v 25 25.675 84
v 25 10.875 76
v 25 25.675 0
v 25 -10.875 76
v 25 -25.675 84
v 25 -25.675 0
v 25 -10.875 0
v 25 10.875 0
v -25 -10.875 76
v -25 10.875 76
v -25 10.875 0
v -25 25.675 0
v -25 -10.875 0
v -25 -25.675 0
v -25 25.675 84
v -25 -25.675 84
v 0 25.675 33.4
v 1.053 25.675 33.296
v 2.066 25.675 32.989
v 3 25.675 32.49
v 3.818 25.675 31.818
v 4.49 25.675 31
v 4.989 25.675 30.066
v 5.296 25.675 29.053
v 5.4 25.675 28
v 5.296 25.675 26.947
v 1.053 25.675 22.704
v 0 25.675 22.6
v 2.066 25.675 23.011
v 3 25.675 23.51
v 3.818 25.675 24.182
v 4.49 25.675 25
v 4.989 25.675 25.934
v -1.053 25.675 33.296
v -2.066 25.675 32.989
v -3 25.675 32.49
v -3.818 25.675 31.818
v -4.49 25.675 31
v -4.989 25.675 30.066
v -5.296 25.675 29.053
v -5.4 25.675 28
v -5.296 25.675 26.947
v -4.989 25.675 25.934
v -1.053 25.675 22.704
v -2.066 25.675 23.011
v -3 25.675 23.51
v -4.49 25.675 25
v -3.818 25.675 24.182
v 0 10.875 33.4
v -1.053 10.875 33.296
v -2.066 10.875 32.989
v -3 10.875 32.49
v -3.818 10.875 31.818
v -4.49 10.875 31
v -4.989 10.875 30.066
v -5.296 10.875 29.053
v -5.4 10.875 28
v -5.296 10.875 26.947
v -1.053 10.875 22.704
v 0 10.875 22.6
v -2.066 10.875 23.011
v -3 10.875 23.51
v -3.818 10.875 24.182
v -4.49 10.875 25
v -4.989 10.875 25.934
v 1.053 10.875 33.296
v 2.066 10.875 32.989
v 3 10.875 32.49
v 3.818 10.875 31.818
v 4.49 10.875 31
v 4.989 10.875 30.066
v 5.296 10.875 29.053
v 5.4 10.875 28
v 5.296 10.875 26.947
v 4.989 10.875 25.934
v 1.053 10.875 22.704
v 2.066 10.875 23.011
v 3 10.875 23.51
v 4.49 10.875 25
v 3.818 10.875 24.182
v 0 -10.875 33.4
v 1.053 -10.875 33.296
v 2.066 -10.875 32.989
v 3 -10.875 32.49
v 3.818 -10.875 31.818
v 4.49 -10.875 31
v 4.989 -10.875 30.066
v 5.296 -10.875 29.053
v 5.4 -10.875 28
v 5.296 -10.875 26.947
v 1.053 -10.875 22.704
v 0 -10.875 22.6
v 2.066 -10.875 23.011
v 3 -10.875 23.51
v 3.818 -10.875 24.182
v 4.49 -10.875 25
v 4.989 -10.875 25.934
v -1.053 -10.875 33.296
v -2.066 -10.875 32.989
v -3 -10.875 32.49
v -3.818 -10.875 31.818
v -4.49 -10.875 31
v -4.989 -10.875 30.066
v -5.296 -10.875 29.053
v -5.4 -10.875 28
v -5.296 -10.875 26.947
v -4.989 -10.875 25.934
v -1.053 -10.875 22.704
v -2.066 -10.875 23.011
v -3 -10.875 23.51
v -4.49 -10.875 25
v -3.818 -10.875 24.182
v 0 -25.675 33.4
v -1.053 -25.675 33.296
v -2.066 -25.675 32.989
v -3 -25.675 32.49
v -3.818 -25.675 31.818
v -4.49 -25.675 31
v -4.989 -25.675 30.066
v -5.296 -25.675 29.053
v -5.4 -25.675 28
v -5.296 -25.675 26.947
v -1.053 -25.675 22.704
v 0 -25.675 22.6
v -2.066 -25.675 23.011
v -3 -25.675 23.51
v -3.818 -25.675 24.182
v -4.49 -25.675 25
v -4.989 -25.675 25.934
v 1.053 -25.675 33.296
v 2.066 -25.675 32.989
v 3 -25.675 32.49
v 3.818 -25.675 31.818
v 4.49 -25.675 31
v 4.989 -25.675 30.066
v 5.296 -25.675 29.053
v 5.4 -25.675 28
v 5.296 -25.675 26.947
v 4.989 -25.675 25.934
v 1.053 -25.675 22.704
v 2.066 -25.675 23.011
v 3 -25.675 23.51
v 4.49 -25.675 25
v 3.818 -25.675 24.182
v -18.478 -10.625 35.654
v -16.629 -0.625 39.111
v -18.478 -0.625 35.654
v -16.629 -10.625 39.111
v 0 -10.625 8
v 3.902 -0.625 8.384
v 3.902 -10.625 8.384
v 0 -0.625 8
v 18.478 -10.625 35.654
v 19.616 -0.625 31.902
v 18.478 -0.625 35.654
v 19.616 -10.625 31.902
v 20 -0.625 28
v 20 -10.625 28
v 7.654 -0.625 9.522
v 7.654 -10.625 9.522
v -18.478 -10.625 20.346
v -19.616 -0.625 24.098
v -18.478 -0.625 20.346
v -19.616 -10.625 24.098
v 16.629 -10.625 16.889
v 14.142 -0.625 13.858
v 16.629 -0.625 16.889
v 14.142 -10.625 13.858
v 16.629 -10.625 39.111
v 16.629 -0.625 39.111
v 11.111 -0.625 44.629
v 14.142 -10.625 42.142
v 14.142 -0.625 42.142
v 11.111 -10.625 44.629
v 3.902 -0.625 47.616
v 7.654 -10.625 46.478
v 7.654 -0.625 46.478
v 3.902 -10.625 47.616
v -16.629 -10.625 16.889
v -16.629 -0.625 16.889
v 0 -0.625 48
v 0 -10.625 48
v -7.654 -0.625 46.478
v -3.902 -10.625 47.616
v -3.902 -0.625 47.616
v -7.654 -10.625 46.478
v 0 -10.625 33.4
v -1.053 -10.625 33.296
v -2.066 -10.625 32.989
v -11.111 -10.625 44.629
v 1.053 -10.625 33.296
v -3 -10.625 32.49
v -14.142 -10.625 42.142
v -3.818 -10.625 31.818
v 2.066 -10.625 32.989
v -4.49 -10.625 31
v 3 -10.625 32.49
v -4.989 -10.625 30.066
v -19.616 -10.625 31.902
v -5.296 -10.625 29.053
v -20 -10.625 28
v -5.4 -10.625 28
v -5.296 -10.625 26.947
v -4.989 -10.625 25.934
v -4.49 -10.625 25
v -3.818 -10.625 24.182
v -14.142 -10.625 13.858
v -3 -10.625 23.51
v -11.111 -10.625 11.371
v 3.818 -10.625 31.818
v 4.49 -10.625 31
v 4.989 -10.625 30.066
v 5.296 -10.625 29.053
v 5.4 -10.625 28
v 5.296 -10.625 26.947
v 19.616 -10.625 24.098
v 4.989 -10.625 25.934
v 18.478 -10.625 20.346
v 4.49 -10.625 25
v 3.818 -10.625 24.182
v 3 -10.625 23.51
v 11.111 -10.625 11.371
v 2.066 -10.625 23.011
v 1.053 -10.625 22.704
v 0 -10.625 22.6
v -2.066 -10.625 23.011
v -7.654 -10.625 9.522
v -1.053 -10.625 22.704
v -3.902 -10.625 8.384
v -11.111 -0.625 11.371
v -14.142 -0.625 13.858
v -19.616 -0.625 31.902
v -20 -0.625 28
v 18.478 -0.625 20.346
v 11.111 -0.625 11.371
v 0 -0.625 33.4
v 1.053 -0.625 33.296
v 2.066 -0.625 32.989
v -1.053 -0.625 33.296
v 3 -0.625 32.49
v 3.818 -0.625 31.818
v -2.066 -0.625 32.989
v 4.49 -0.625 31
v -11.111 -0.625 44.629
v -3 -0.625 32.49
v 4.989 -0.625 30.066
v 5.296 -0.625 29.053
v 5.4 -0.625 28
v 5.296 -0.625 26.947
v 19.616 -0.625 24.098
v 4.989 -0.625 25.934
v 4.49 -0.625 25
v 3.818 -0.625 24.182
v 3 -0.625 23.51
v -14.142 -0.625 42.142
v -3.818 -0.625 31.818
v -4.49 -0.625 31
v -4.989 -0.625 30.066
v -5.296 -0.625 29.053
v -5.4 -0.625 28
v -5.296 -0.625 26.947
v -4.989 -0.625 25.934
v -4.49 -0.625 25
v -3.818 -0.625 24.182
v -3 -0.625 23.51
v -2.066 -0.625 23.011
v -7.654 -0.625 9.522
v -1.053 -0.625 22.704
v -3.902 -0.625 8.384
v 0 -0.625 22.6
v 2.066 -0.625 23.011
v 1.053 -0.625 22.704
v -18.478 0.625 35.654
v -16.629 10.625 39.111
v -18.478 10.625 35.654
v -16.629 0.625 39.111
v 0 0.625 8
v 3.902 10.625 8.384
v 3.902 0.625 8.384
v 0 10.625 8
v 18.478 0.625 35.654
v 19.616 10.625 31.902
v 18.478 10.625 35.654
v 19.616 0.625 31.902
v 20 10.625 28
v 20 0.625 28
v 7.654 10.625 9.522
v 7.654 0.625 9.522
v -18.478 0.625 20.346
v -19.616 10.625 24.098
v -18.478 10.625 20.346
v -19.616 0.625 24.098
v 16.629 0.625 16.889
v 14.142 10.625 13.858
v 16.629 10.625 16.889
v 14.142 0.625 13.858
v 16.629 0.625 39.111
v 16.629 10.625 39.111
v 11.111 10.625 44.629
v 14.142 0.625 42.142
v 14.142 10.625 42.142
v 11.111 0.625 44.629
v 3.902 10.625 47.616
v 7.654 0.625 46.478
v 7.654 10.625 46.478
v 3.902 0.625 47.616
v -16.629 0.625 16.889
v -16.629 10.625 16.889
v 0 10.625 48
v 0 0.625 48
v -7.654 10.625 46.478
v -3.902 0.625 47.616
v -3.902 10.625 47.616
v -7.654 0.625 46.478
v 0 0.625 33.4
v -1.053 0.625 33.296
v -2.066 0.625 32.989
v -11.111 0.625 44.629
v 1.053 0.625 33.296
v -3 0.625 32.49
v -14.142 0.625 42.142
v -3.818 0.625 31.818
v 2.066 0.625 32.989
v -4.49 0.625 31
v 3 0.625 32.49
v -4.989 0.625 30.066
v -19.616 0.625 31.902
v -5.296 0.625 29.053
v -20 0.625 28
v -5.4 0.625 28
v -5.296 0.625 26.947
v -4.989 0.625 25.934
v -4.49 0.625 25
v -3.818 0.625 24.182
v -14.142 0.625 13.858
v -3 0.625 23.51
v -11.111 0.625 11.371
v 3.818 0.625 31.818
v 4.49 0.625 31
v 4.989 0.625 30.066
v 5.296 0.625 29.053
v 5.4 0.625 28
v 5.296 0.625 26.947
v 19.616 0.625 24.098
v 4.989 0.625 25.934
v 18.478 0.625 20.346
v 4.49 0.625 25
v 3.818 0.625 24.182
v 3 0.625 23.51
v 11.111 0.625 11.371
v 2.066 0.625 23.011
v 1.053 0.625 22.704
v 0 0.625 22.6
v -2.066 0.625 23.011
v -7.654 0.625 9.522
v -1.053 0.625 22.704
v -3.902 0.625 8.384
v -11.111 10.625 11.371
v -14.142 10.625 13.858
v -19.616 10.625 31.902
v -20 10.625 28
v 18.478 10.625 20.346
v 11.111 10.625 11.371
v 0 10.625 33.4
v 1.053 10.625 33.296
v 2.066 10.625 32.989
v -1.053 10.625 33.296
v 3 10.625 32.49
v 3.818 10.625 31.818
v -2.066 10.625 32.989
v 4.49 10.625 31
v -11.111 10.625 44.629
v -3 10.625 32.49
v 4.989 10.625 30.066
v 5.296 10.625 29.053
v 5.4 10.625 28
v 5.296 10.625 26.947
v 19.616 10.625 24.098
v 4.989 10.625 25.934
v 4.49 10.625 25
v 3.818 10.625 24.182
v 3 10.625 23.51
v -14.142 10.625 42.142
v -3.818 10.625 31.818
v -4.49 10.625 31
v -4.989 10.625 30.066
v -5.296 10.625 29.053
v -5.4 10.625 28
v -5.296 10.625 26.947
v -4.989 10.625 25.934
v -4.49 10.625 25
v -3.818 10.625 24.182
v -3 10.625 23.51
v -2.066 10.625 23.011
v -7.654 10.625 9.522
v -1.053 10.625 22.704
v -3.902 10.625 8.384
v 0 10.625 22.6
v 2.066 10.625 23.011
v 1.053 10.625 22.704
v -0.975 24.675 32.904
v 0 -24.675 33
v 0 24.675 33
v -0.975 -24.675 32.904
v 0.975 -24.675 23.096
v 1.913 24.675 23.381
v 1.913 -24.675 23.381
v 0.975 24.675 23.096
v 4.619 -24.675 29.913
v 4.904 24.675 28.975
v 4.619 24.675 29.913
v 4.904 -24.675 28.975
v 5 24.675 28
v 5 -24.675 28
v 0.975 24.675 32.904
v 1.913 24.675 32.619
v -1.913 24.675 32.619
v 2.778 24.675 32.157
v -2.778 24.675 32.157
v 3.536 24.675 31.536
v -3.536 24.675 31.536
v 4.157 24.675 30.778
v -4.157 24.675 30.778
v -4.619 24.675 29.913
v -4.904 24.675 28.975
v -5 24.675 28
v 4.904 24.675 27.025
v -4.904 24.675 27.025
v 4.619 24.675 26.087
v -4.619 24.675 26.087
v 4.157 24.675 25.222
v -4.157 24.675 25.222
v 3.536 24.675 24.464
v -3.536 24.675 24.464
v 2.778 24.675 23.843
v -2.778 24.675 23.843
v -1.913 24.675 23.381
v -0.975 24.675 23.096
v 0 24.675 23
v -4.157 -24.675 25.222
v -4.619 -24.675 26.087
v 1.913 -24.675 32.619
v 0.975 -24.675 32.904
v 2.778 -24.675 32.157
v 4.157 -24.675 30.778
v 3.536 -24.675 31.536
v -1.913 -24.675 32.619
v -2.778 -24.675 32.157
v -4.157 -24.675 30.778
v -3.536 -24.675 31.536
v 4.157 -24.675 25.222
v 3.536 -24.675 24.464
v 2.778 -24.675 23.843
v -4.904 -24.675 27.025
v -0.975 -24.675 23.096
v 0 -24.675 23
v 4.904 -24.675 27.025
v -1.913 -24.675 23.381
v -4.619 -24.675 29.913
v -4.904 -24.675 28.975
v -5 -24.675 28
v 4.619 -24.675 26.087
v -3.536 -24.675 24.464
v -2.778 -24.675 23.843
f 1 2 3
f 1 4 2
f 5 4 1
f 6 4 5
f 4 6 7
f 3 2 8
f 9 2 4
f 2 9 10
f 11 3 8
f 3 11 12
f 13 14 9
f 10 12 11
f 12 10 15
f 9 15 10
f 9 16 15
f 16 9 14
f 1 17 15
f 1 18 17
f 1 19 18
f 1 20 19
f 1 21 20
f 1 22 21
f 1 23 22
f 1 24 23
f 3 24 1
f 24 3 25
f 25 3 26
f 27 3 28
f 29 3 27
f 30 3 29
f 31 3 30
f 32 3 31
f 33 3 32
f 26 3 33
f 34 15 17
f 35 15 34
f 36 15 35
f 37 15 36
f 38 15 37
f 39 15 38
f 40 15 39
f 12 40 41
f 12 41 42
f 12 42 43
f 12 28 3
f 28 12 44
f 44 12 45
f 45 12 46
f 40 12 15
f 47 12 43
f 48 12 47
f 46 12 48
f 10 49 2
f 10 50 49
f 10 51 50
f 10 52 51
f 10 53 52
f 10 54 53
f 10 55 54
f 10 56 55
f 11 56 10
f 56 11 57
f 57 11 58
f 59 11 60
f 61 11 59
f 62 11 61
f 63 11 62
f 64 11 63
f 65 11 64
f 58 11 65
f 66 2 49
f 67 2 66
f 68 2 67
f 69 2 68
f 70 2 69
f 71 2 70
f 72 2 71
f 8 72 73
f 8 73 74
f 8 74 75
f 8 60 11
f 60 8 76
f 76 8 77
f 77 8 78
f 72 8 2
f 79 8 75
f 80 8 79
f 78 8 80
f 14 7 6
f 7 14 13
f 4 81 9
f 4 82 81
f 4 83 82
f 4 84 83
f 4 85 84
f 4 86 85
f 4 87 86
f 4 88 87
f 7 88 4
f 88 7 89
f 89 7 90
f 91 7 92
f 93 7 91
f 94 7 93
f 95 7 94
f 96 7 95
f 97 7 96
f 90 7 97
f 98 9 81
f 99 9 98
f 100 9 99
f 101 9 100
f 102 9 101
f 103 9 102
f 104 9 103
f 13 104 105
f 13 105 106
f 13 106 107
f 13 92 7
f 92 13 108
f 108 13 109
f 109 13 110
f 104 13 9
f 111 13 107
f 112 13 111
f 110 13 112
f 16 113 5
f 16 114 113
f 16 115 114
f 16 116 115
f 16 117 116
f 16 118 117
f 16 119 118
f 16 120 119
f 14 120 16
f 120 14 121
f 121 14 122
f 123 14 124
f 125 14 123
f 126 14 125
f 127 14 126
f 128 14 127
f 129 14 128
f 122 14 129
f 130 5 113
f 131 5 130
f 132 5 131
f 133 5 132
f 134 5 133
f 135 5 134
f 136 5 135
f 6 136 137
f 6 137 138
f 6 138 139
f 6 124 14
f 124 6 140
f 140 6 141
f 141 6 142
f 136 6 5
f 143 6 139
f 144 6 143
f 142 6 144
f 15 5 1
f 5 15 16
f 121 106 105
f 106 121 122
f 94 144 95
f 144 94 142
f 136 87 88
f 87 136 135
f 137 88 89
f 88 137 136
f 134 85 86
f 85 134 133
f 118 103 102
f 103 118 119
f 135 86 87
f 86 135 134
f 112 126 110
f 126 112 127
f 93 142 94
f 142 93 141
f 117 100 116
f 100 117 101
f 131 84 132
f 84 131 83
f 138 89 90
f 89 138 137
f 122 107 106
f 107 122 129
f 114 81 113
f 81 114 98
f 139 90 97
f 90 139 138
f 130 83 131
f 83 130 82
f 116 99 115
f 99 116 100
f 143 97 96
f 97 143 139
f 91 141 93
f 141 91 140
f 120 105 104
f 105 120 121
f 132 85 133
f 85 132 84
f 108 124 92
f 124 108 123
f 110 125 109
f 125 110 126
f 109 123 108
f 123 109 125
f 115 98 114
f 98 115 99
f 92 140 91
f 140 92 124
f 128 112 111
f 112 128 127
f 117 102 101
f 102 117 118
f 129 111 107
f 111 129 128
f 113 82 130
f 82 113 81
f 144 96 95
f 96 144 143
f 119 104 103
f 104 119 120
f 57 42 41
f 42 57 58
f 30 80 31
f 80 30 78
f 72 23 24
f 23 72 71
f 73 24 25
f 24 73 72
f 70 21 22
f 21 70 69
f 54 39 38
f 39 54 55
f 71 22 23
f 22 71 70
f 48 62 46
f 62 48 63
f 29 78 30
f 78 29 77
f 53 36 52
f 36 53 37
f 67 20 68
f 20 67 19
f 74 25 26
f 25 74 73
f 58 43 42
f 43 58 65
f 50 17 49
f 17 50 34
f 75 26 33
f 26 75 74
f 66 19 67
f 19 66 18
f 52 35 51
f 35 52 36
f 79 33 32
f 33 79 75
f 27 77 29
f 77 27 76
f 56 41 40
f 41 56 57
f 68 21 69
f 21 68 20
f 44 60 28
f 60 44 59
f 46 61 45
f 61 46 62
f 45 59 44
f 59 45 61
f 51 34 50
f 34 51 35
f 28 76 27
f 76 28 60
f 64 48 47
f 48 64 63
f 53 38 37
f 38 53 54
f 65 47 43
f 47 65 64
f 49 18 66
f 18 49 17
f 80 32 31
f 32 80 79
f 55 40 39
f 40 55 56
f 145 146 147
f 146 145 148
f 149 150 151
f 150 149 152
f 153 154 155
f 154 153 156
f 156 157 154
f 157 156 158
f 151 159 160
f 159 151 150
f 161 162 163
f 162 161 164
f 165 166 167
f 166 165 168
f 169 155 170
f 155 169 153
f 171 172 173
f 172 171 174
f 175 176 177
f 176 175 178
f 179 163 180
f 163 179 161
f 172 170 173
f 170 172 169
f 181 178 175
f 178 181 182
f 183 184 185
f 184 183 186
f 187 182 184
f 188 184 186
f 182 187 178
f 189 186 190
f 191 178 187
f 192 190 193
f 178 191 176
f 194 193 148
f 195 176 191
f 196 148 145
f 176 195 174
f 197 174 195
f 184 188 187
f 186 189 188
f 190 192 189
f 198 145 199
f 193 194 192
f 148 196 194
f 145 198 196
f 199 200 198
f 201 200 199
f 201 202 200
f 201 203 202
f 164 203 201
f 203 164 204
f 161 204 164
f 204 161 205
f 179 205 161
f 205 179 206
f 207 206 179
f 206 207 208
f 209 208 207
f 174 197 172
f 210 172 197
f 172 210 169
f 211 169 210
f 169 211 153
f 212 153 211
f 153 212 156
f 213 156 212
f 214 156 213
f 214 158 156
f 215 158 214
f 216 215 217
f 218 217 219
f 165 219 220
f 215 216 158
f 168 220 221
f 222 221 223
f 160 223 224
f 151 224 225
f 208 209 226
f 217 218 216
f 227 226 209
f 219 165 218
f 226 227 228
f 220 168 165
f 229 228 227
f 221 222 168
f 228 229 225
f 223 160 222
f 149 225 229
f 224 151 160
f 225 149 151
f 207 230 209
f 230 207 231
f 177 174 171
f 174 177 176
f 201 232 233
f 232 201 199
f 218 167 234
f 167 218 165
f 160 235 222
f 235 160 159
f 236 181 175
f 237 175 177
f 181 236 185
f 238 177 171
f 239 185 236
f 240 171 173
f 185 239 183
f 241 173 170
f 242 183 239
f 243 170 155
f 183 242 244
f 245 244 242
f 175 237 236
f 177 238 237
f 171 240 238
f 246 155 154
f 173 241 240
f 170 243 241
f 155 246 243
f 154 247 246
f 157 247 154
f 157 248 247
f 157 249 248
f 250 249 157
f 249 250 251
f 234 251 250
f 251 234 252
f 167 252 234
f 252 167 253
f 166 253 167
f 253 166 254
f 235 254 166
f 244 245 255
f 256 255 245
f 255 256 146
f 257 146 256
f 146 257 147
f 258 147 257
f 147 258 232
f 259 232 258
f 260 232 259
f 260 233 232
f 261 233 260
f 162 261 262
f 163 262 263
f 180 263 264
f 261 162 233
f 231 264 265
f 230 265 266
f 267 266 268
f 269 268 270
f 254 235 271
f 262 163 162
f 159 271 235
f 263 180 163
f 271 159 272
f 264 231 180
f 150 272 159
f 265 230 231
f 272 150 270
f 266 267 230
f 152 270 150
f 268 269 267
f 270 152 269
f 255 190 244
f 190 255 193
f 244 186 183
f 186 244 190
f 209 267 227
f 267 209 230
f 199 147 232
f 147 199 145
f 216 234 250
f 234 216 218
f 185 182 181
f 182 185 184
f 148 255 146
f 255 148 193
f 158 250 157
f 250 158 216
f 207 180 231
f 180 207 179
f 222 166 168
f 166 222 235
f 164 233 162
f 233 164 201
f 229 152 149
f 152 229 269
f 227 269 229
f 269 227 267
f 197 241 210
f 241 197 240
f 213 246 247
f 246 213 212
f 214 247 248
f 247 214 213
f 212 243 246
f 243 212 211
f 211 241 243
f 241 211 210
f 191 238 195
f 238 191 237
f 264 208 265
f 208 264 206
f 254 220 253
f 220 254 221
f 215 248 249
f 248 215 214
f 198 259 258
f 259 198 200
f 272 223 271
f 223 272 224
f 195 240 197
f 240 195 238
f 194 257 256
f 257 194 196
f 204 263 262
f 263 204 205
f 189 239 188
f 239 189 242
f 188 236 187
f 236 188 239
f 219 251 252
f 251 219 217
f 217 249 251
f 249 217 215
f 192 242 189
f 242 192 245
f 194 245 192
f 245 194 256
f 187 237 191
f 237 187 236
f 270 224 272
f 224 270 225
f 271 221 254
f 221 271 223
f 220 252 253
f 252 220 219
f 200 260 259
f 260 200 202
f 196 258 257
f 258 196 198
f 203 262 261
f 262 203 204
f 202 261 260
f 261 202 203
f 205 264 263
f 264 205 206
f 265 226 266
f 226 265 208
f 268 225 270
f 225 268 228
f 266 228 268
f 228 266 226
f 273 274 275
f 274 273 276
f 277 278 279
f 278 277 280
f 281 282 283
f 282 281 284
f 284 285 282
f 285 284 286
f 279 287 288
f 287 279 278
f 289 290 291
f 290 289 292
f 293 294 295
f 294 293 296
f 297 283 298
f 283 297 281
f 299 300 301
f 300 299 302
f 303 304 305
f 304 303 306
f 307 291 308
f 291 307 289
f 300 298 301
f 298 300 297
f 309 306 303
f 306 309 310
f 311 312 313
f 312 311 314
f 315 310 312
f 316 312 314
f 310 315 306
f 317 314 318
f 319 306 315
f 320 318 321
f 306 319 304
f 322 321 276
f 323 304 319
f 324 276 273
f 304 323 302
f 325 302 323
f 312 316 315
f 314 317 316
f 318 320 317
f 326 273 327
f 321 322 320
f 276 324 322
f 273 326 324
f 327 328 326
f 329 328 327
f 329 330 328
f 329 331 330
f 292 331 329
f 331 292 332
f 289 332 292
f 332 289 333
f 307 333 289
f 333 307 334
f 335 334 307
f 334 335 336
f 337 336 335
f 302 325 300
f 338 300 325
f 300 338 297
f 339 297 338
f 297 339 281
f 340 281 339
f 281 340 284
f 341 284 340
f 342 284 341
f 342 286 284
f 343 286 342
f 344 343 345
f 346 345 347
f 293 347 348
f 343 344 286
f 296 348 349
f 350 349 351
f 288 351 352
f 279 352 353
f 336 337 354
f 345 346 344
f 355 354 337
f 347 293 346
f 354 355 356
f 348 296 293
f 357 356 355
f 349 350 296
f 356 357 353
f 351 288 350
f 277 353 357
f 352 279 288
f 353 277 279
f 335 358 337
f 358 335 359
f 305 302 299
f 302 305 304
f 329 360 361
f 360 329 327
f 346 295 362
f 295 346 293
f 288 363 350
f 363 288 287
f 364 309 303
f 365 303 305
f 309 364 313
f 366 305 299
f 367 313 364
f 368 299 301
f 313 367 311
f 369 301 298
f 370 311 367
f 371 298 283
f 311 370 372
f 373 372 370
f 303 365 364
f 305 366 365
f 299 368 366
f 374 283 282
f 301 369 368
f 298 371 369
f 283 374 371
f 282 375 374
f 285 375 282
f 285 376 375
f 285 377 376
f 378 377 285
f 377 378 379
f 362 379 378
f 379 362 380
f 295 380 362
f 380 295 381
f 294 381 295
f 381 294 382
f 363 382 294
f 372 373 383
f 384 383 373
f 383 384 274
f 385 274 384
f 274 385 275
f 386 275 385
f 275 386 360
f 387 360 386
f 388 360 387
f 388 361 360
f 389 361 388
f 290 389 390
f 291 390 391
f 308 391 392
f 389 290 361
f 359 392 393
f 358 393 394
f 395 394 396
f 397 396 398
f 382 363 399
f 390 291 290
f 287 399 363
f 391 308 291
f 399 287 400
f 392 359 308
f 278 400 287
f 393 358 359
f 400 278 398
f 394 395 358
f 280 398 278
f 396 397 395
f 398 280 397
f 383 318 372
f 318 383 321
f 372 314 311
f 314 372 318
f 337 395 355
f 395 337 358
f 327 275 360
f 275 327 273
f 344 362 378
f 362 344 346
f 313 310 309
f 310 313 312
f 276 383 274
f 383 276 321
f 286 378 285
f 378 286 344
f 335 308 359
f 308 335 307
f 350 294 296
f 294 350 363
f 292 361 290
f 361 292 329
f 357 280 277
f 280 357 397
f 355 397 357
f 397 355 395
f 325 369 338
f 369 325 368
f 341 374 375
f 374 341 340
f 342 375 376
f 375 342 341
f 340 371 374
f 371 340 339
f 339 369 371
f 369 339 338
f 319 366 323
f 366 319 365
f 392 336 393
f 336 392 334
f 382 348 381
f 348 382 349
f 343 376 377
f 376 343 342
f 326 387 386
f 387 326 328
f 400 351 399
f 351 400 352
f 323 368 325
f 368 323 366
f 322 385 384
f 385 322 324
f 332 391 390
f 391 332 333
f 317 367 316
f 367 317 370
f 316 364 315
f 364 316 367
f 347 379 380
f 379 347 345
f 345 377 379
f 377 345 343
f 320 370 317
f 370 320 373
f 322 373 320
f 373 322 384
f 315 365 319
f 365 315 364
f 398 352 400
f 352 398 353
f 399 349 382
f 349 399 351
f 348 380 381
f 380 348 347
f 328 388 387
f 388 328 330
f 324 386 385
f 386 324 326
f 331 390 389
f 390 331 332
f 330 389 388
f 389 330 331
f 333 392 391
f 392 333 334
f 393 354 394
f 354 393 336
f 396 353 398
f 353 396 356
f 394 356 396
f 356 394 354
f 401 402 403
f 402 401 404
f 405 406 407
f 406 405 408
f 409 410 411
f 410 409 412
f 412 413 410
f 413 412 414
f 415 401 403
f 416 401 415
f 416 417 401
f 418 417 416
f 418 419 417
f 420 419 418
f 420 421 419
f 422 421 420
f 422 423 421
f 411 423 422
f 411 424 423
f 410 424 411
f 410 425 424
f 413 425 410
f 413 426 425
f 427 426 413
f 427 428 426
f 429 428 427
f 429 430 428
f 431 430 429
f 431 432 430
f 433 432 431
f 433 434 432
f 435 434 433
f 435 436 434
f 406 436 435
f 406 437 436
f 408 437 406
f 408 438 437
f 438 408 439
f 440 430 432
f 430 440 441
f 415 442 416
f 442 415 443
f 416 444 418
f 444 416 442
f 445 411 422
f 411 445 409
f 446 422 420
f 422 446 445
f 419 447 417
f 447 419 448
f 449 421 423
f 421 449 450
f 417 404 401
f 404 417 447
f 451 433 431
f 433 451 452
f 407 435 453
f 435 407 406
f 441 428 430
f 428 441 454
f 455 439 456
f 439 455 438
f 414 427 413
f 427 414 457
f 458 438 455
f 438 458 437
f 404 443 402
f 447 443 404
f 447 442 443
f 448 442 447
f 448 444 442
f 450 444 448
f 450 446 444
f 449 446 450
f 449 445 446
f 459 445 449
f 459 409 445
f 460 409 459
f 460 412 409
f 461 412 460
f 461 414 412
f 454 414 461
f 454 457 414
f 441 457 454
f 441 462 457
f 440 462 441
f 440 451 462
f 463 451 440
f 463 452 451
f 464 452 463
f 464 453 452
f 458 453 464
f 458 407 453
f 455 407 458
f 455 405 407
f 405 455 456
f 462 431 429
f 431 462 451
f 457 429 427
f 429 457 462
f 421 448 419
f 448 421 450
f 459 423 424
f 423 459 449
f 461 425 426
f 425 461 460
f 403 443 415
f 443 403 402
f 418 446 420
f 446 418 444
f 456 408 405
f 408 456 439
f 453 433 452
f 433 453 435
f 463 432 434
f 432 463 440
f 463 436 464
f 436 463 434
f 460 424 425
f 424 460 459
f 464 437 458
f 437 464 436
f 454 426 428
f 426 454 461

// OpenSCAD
$fn = 32;

// ------------------------------------------------------------------------
// Trolley wheel set: wheels d40, fork 76 mm tall
// Every part is its own module, assembly() places every instance.
// ------------------------------------------------------------------------

// --- part 1 ---
module trolley_fork() {
  difference() {
    union() {
      translate([-25, 10.875, 0]) cube([50, 14.8, 76]);
      translate([-25, -25.675, 0]) cube([50, 14.8, 76]);
      translate([-25, -25.675, 76]) cube([50, 51.35, 8]);
    }
    translate([0, -18.275, 28]) rotate([90, 0, 0]) cylinder(h = 16.8, d = 10.8, center = true);
    translate([0, 18.275, 28]) rotate([90, 0, 0]) cylinder(h = 16.8, d = 10.8, center = true);
  }
}

// --- part 2 ---
module trolley_wheel() {
  difference() {
      translate([0, 0, 0]) cylinder(h = 10, d = 40);
      translate([0, 0, -1]) cylinder(h = 12, d = 10.8);
    }
}

// --- part 3 ---
module trolley_axle() {
  translate([0, 0, -24.675]) cylinder(h = 49.35, d = 10);
}

// --- assembly ---
module assembly() {
  color([0.80, 0.24, 0.20]) translate([0, 0, 0]) rotate([0, 0, 0]) trolley_fork();
  color([0.20, 0.45, 0.75]) translate([0, -0.625, 28]) rotate([90, 0, 0]) trolley_wheel();
  color([0.25, 0.62, 0.32]) translate([0, 10.625, 28]) rotate([90, 0, 0]) trolley_wheel();
  color([0.92, 0.70, 0.18]) translate([0, 0, 28]) rotate([90, 0, 0]) trolley_axle();
}

assembly();
